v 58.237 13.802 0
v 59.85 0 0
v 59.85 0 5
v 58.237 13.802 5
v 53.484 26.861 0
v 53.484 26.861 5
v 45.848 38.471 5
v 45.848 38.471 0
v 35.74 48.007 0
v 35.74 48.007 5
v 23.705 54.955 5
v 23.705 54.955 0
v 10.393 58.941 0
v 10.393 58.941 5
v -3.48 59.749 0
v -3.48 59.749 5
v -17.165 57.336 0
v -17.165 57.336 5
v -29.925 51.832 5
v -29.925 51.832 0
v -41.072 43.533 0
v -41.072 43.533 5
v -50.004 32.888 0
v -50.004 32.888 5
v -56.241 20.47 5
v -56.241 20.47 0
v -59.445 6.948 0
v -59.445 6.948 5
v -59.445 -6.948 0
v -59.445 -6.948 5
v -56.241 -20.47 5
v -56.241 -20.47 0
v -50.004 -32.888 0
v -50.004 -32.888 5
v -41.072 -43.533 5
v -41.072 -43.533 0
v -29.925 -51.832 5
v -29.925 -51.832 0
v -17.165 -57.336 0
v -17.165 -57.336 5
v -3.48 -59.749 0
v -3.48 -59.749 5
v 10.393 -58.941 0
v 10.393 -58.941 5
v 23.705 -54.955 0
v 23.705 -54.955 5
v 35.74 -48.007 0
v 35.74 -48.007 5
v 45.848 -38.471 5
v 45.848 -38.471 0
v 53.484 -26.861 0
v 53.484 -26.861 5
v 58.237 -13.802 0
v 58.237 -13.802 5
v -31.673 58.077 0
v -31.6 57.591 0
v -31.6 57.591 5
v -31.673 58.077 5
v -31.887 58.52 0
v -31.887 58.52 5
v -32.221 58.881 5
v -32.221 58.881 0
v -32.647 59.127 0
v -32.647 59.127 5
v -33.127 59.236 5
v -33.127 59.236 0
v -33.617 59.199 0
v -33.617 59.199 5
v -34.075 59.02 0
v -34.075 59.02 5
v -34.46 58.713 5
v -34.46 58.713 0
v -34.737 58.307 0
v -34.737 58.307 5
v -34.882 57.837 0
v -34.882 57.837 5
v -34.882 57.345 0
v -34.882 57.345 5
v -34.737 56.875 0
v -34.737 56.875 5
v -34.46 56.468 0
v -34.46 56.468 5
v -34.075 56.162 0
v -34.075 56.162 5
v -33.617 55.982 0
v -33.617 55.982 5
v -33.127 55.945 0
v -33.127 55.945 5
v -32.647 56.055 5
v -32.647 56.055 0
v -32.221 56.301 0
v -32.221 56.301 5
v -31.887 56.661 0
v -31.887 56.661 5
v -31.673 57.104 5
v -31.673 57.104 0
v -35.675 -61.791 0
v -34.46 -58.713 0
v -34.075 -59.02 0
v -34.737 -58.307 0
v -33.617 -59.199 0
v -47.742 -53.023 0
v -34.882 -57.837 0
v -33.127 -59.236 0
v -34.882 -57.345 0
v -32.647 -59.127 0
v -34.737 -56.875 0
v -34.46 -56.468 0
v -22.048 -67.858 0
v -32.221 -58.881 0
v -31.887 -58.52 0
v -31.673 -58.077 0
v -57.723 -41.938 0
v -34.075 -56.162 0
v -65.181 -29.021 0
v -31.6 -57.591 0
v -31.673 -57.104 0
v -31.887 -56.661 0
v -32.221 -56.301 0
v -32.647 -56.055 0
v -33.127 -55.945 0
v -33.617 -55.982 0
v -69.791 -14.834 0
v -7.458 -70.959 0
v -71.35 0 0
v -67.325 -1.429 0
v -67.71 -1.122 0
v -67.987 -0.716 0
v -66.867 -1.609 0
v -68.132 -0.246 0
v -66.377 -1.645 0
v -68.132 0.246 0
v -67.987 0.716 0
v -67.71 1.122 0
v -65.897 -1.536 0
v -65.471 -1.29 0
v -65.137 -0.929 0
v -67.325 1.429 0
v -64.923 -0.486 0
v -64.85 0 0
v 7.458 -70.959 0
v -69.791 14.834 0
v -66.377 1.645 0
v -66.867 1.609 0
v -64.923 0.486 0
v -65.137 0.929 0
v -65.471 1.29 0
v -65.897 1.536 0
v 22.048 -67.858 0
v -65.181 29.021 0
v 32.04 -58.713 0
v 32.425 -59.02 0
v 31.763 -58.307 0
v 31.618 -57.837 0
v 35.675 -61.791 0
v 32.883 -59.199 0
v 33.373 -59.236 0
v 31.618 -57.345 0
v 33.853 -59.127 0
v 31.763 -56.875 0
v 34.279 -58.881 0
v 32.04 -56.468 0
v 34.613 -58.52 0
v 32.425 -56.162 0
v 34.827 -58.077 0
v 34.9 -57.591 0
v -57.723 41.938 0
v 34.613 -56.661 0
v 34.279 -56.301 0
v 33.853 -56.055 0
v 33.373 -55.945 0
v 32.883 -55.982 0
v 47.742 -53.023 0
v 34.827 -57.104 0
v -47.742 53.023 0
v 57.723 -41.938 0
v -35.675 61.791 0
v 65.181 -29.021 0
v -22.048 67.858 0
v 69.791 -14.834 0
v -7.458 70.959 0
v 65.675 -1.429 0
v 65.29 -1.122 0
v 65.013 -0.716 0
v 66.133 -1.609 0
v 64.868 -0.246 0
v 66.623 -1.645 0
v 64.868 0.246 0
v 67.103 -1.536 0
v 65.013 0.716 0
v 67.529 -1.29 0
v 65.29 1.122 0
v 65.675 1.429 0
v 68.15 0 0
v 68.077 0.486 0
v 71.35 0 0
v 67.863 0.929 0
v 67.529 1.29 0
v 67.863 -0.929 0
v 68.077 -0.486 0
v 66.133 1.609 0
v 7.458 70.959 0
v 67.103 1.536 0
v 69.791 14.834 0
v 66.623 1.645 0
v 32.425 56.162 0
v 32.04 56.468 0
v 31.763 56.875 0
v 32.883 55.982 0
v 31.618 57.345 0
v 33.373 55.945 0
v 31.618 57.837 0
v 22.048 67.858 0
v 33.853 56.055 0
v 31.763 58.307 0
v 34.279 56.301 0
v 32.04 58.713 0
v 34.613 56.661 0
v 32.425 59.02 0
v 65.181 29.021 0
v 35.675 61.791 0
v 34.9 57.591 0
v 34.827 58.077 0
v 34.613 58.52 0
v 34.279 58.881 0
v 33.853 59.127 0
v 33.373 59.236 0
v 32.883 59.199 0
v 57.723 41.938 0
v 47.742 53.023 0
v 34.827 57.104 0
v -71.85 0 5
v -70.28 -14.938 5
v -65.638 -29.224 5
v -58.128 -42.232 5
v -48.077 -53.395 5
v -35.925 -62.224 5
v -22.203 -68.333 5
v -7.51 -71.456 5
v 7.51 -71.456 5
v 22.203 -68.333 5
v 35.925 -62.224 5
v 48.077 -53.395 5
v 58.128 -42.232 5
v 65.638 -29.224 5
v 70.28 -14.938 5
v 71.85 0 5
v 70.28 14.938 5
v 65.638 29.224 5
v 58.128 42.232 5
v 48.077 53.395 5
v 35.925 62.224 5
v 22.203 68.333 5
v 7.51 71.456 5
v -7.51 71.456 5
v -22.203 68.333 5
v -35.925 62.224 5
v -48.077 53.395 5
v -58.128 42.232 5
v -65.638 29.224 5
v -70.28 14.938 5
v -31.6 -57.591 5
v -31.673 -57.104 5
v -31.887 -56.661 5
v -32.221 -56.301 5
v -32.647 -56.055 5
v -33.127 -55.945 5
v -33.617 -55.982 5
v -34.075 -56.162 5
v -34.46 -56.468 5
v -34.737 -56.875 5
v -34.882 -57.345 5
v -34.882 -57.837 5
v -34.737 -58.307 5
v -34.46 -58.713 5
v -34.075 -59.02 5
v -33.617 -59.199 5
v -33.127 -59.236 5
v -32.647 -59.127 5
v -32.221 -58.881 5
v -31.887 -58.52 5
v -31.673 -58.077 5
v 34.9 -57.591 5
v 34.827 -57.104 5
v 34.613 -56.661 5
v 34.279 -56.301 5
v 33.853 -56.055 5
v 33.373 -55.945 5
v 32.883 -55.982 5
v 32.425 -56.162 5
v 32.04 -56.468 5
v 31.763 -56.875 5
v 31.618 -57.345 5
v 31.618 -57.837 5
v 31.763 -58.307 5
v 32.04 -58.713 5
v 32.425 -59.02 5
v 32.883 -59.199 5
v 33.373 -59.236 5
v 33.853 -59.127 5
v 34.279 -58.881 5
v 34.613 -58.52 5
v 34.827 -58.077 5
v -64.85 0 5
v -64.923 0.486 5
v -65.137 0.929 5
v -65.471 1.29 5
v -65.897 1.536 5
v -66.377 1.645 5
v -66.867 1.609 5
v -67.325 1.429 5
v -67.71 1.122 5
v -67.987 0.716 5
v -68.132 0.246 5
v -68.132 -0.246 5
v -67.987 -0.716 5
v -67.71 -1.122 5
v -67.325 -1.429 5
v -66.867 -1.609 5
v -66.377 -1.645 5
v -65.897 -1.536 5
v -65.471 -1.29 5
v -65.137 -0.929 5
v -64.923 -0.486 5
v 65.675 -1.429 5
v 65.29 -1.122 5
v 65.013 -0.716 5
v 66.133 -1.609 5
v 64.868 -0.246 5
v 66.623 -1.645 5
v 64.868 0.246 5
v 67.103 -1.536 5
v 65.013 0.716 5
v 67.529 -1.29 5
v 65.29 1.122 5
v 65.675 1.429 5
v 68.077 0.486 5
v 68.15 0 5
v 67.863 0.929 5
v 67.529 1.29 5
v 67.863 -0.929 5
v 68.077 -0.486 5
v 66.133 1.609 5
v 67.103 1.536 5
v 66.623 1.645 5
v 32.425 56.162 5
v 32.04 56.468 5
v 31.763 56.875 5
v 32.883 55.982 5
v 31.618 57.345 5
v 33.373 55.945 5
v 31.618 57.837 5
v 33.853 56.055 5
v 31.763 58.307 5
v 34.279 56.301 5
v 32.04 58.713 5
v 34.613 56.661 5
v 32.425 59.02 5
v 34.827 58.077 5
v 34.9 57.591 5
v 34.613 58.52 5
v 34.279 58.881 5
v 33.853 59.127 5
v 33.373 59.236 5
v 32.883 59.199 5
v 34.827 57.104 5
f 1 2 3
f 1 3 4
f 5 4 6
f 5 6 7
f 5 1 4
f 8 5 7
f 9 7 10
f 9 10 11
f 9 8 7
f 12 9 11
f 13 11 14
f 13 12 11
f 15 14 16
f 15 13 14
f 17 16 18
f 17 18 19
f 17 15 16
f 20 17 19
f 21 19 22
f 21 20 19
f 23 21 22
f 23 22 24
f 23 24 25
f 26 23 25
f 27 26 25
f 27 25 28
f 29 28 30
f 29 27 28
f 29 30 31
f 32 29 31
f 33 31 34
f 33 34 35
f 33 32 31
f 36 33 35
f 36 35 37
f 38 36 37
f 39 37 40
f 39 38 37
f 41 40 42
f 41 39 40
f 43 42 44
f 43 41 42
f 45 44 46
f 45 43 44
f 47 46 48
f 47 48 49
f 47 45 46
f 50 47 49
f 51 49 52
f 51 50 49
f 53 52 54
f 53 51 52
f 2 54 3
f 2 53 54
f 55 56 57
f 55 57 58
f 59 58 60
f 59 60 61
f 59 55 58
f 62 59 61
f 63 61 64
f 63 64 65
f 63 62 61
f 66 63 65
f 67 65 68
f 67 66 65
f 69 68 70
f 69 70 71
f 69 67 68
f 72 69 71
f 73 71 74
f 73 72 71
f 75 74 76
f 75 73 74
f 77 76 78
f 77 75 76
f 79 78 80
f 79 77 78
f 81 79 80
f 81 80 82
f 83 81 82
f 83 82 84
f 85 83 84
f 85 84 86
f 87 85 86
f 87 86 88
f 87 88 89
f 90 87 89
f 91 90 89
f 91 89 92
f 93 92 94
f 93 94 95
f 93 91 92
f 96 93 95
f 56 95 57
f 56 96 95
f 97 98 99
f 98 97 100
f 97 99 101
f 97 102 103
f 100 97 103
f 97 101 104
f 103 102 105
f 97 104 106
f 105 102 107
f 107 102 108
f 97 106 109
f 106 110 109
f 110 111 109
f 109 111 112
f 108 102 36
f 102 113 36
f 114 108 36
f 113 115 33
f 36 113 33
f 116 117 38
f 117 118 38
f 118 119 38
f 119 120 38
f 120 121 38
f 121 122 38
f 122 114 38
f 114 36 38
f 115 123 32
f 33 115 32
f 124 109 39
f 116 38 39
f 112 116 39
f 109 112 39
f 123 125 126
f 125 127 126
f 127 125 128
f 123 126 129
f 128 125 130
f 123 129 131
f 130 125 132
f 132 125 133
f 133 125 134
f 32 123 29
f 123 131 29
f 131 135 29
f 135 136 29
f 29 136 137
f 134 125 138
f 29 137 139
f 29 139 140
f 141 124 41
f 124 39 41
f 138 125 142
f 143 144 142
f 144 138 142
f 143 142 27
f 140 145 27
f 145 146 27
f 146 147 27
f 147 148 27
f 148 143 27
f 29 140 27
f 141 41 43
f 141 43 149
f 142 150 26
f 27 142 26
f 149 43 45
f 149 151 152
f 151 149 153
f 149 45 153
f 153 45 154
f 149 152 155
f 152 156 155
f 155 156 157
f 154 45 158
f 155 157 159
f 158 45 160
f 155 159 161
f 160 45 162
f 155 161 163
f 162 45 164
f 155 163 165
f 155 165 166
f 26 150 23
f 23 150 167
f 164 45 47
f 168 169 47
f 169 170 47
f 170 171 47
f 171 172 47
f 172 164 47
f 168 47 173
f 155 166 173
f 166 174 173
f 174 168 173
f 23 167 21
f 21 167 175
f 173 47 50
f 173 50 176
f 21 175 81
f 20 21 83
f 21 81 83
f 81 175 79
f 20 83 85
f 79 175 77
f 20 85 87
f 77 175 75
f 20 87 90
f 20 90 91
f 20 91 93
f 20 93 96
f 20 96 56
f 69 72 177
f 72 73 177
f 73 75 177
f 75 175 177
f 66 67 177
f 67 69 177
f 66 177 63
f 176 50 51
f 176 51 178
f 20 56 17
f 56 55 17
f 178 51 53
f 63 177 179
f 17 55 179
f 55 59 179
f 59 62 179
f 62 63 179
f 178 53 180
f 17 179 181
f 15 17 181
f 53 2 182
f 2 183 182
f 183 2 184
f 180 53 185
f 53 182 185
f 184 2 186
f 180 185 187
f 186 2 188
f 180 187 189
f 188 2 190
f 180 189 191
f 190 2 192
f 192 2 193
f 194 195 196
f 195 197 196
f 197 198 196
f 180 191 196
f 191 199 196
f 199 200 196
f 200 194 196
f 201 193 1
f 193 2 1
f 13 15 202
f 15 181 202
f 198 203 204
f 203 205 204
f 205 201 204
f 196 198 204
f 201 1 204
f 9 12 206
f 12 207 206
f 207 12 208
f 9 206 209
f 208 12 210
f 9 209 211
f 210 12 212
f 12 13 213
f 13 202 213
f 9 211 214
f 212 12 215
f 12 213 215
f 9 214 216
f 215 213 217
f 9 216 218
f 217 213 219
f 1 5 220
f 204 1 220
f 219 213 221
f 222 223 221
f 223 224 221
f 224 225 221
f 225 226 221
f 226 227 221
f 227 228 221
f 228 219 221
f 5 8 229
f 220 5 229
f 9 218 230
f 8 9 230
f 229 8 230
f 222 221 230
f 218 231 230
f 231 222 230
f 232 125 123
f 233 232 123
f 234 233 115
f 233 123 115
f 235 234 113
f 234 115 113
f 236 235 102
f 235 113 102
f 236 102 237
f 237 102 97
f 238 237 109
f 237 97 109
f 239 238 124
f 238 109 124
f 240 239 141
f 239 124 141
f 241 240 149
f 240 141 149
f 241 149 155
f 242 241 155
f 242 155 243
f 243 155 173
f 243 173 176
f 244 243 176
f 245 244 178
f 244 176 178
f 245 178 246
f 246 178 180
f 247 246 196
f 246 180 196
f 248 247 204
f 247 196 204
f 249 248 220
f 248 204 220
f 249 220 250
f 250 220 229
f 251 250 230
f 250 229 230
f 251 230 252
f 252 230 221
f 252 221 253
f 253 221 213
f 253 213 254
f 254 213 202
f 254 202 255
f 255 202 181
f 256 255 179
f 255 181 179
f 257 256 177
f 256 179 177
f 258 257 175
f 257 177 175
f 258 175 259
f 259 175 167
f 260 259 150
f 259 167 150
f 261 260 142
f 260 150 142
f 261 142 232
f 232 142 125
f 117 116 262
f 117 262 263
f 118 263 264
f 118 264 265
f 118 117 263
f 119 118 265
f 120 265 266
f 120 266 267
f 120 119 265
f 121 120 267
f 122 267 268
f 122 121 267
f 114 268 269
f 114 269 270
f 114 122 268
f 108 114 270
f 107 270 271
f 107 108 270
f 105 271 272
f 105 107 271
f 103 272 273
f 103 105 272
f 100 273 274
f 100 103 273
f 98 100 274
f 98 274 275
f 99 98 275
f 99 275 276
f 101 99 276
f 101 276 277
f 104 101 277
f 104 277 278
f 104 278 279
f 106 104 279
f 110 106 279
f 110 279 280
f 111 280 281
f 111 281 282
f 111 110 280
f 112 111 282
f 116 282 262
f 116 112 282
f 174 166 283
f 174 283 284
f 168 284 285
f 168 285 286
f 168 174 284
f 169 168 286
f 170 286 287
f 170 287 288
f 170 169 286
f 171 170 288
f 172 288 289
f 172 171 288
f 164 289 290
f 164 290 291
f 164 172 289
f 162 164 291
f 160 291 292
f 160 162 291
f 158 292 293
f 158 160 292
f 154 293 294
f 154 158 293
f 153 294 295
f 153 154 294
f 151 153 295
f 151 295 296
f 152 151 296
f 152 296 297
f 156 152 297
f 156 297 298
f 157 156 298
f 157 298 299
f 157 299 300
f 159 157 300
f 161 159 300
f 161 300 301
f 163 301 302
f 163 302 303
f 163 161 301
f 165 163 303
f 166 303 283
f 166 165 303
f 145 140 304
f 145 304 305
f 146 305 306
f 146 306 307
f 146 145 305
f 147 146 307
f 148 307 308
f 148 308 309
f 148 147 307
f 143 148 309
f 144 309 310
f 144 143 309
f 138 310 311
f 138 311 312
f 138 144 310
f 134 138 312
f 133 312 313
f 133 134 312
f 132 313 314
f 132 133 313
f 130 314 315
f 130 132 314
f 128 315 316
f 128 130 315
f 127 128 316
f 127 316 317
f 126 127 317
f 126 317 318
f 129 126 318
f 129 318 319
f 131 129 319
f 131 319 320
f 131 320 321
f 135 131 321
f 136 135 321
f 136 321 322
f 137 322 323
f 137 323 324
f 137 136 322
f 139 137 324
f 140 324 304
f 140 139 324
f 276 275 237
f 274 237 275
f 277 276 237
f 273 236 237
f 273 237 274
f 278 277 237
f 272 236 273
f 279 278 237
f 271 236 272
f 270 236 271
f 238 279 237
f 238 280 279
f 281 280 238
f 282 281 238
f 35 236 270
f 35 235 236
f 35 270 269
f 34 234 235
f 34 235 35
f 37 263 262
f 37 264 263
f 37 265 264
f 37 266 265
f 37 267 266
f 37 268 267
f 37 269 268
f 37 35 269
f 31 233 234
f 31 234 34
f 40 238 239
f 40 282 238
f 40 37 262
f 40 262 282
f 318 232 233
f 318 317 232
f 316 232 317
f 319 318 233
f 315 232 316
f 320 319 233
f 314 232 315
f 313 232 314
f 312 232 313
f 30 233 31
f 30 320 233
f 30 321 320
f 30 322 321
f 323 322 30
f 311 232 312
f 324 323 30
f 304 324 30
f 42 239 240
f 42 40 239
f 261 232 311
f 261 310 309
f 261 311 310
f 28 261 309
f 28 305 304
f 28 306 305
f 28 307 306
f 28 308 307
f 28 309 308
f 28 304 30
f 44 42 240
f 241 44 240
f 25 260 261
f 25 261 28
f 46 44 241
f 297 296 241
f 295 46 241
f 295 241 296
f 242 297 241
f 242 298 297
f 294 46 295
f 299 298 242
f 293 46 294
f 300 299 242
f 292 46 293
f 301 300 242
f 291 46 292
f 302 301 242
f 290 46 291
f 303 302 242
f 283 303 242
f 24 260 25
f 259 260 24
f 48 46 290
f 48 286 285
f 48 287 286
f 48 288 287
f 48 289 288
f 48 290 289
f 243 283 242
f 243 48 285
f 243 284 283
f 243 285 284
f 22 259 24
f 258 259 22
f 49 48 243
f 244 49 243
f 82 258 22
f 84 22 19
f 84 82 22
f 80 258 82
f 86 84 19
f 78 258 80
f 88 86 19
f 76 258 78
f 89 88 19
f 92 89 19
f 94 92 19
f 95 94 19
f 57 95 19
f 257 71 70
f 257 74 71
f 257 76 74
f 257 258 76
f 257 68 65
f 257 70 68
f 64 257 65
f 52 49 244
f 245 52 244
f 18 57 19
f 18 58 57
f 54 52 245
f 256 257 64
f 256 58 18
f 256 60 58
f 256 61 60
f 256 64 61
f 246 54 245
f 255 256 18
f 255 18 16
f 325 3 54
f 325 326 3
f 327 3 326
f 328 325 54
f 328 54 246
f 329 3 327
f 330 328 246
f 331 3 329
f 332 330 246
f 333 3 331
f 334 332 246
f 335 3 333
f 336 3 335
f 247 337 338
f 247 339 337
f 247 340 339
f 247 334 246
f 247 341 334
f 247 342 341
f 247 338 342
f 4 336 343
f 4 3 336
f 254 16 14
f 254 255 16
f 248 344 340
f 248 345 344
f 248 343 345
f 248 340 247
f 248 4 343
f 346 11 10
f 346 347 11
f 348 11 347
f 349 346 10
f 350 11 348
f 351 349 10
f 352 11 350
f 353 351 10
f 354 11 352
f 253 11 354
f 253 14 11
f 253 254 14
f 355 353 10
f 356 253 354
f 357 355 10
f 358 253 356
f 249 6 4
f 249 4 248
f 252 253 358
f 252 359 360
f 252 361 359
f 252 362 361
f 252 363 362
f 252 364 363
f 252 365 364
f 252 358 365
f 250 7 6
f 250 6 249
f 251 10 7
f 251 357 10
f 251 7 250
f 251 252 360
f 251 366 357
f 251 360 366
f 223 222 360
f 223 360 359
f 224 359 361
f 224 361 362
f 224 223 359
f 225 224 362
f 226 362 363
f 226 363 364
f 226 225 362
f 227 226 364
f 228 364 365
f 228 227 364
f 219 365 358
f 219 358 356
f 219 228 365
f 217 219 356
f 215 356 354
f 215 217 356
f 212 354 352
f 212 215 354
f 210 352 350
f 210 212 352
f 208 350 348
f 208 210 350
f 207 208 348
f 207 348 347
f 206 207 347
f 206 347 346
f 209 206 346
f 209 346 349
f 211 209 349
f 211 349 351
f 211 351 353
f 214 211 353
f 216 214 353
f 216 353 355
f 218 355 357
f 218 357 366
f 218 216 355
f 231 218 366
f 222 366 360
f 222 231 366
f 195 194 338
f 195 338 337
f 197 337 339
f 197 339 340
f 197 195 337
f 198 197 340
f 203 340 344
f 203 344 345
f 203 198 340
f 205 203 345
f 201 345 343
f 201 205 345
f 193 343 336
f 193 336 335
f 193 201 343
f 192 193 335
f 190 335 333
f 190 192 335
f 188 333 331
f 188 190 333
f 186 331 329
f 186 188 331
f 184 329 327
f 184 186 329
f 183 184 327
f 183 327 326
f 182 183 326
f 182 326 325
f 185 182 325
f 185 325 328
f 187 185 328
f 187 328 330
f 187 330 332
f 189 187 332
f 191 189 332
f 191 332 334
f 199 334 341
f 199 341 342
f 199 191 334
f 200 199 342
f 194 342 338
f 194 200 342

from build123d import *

# Parameters (mm, degrees)
SKETCH1_R           = 71.85
SKETCH1_R_2         = 59.85
SKETCH1_R_3         = 1.65
BOSS_EXTRUDE1_DEPTH = 5


with BuildPart() as part:
    # Sketch1 → Boss-Extrude1 (new body)
    with BuildSketch(Plane.XY):
        Circle(SKETCH1_R)
        Circle(SKETCH1_R_2, mode=Mode.SUBTRACT)
        with Locations((66.5, 0)):
            Circle(SKETCH1_R_3, mode=Mode.SUBTRACT)
        with Locations((33.25, -57.590689352)):
            Circle(SKETCH1_R_3, mode=Mode.SUBTRACT)
        with Locations((-33.25, -57.590689352)):
            Circle(SKETCH1_R_3, mode=Mode.SUBTRACT)
        with Locations((-66.5, 0)):
            Circle(SKETCH1_R_3, mode=Mode.SUBTRACT)
        with Locations((-33.25, 57.590689352)):
            Circle(SKETCH1_R_3, mode=Mode.SUBTRACT)
        with Locations((33.25, 57.590689352)):
            Circle(SKETCH1_R_3, mode=Mode.SUBTRACT)
    extrude(amount=BOSS_EXTRUDE1_DEPTH)

    # Sketch2 → Cut-Revolve1 (revolve, cut)
    with BuildSketch(Plane(origin=(0, 0, 0), x_dir=(1, 0, 0), z_dir=(0, 1, 0)), mode=Mode.PRIVATE) as cut_revolve1_sk:
        Polygon((71.35, 0), (71.85, 0), (71.85, -5), align=None)
    revolve(cut_revolve1_sk.sketch.rotate(Axis((0, 0, 0), (0, 0, 1)), 180), axis=Axis((0, 0, 0), (0, 0, 1)), mode=Mode.SUBTRACT)


solid = part.part
